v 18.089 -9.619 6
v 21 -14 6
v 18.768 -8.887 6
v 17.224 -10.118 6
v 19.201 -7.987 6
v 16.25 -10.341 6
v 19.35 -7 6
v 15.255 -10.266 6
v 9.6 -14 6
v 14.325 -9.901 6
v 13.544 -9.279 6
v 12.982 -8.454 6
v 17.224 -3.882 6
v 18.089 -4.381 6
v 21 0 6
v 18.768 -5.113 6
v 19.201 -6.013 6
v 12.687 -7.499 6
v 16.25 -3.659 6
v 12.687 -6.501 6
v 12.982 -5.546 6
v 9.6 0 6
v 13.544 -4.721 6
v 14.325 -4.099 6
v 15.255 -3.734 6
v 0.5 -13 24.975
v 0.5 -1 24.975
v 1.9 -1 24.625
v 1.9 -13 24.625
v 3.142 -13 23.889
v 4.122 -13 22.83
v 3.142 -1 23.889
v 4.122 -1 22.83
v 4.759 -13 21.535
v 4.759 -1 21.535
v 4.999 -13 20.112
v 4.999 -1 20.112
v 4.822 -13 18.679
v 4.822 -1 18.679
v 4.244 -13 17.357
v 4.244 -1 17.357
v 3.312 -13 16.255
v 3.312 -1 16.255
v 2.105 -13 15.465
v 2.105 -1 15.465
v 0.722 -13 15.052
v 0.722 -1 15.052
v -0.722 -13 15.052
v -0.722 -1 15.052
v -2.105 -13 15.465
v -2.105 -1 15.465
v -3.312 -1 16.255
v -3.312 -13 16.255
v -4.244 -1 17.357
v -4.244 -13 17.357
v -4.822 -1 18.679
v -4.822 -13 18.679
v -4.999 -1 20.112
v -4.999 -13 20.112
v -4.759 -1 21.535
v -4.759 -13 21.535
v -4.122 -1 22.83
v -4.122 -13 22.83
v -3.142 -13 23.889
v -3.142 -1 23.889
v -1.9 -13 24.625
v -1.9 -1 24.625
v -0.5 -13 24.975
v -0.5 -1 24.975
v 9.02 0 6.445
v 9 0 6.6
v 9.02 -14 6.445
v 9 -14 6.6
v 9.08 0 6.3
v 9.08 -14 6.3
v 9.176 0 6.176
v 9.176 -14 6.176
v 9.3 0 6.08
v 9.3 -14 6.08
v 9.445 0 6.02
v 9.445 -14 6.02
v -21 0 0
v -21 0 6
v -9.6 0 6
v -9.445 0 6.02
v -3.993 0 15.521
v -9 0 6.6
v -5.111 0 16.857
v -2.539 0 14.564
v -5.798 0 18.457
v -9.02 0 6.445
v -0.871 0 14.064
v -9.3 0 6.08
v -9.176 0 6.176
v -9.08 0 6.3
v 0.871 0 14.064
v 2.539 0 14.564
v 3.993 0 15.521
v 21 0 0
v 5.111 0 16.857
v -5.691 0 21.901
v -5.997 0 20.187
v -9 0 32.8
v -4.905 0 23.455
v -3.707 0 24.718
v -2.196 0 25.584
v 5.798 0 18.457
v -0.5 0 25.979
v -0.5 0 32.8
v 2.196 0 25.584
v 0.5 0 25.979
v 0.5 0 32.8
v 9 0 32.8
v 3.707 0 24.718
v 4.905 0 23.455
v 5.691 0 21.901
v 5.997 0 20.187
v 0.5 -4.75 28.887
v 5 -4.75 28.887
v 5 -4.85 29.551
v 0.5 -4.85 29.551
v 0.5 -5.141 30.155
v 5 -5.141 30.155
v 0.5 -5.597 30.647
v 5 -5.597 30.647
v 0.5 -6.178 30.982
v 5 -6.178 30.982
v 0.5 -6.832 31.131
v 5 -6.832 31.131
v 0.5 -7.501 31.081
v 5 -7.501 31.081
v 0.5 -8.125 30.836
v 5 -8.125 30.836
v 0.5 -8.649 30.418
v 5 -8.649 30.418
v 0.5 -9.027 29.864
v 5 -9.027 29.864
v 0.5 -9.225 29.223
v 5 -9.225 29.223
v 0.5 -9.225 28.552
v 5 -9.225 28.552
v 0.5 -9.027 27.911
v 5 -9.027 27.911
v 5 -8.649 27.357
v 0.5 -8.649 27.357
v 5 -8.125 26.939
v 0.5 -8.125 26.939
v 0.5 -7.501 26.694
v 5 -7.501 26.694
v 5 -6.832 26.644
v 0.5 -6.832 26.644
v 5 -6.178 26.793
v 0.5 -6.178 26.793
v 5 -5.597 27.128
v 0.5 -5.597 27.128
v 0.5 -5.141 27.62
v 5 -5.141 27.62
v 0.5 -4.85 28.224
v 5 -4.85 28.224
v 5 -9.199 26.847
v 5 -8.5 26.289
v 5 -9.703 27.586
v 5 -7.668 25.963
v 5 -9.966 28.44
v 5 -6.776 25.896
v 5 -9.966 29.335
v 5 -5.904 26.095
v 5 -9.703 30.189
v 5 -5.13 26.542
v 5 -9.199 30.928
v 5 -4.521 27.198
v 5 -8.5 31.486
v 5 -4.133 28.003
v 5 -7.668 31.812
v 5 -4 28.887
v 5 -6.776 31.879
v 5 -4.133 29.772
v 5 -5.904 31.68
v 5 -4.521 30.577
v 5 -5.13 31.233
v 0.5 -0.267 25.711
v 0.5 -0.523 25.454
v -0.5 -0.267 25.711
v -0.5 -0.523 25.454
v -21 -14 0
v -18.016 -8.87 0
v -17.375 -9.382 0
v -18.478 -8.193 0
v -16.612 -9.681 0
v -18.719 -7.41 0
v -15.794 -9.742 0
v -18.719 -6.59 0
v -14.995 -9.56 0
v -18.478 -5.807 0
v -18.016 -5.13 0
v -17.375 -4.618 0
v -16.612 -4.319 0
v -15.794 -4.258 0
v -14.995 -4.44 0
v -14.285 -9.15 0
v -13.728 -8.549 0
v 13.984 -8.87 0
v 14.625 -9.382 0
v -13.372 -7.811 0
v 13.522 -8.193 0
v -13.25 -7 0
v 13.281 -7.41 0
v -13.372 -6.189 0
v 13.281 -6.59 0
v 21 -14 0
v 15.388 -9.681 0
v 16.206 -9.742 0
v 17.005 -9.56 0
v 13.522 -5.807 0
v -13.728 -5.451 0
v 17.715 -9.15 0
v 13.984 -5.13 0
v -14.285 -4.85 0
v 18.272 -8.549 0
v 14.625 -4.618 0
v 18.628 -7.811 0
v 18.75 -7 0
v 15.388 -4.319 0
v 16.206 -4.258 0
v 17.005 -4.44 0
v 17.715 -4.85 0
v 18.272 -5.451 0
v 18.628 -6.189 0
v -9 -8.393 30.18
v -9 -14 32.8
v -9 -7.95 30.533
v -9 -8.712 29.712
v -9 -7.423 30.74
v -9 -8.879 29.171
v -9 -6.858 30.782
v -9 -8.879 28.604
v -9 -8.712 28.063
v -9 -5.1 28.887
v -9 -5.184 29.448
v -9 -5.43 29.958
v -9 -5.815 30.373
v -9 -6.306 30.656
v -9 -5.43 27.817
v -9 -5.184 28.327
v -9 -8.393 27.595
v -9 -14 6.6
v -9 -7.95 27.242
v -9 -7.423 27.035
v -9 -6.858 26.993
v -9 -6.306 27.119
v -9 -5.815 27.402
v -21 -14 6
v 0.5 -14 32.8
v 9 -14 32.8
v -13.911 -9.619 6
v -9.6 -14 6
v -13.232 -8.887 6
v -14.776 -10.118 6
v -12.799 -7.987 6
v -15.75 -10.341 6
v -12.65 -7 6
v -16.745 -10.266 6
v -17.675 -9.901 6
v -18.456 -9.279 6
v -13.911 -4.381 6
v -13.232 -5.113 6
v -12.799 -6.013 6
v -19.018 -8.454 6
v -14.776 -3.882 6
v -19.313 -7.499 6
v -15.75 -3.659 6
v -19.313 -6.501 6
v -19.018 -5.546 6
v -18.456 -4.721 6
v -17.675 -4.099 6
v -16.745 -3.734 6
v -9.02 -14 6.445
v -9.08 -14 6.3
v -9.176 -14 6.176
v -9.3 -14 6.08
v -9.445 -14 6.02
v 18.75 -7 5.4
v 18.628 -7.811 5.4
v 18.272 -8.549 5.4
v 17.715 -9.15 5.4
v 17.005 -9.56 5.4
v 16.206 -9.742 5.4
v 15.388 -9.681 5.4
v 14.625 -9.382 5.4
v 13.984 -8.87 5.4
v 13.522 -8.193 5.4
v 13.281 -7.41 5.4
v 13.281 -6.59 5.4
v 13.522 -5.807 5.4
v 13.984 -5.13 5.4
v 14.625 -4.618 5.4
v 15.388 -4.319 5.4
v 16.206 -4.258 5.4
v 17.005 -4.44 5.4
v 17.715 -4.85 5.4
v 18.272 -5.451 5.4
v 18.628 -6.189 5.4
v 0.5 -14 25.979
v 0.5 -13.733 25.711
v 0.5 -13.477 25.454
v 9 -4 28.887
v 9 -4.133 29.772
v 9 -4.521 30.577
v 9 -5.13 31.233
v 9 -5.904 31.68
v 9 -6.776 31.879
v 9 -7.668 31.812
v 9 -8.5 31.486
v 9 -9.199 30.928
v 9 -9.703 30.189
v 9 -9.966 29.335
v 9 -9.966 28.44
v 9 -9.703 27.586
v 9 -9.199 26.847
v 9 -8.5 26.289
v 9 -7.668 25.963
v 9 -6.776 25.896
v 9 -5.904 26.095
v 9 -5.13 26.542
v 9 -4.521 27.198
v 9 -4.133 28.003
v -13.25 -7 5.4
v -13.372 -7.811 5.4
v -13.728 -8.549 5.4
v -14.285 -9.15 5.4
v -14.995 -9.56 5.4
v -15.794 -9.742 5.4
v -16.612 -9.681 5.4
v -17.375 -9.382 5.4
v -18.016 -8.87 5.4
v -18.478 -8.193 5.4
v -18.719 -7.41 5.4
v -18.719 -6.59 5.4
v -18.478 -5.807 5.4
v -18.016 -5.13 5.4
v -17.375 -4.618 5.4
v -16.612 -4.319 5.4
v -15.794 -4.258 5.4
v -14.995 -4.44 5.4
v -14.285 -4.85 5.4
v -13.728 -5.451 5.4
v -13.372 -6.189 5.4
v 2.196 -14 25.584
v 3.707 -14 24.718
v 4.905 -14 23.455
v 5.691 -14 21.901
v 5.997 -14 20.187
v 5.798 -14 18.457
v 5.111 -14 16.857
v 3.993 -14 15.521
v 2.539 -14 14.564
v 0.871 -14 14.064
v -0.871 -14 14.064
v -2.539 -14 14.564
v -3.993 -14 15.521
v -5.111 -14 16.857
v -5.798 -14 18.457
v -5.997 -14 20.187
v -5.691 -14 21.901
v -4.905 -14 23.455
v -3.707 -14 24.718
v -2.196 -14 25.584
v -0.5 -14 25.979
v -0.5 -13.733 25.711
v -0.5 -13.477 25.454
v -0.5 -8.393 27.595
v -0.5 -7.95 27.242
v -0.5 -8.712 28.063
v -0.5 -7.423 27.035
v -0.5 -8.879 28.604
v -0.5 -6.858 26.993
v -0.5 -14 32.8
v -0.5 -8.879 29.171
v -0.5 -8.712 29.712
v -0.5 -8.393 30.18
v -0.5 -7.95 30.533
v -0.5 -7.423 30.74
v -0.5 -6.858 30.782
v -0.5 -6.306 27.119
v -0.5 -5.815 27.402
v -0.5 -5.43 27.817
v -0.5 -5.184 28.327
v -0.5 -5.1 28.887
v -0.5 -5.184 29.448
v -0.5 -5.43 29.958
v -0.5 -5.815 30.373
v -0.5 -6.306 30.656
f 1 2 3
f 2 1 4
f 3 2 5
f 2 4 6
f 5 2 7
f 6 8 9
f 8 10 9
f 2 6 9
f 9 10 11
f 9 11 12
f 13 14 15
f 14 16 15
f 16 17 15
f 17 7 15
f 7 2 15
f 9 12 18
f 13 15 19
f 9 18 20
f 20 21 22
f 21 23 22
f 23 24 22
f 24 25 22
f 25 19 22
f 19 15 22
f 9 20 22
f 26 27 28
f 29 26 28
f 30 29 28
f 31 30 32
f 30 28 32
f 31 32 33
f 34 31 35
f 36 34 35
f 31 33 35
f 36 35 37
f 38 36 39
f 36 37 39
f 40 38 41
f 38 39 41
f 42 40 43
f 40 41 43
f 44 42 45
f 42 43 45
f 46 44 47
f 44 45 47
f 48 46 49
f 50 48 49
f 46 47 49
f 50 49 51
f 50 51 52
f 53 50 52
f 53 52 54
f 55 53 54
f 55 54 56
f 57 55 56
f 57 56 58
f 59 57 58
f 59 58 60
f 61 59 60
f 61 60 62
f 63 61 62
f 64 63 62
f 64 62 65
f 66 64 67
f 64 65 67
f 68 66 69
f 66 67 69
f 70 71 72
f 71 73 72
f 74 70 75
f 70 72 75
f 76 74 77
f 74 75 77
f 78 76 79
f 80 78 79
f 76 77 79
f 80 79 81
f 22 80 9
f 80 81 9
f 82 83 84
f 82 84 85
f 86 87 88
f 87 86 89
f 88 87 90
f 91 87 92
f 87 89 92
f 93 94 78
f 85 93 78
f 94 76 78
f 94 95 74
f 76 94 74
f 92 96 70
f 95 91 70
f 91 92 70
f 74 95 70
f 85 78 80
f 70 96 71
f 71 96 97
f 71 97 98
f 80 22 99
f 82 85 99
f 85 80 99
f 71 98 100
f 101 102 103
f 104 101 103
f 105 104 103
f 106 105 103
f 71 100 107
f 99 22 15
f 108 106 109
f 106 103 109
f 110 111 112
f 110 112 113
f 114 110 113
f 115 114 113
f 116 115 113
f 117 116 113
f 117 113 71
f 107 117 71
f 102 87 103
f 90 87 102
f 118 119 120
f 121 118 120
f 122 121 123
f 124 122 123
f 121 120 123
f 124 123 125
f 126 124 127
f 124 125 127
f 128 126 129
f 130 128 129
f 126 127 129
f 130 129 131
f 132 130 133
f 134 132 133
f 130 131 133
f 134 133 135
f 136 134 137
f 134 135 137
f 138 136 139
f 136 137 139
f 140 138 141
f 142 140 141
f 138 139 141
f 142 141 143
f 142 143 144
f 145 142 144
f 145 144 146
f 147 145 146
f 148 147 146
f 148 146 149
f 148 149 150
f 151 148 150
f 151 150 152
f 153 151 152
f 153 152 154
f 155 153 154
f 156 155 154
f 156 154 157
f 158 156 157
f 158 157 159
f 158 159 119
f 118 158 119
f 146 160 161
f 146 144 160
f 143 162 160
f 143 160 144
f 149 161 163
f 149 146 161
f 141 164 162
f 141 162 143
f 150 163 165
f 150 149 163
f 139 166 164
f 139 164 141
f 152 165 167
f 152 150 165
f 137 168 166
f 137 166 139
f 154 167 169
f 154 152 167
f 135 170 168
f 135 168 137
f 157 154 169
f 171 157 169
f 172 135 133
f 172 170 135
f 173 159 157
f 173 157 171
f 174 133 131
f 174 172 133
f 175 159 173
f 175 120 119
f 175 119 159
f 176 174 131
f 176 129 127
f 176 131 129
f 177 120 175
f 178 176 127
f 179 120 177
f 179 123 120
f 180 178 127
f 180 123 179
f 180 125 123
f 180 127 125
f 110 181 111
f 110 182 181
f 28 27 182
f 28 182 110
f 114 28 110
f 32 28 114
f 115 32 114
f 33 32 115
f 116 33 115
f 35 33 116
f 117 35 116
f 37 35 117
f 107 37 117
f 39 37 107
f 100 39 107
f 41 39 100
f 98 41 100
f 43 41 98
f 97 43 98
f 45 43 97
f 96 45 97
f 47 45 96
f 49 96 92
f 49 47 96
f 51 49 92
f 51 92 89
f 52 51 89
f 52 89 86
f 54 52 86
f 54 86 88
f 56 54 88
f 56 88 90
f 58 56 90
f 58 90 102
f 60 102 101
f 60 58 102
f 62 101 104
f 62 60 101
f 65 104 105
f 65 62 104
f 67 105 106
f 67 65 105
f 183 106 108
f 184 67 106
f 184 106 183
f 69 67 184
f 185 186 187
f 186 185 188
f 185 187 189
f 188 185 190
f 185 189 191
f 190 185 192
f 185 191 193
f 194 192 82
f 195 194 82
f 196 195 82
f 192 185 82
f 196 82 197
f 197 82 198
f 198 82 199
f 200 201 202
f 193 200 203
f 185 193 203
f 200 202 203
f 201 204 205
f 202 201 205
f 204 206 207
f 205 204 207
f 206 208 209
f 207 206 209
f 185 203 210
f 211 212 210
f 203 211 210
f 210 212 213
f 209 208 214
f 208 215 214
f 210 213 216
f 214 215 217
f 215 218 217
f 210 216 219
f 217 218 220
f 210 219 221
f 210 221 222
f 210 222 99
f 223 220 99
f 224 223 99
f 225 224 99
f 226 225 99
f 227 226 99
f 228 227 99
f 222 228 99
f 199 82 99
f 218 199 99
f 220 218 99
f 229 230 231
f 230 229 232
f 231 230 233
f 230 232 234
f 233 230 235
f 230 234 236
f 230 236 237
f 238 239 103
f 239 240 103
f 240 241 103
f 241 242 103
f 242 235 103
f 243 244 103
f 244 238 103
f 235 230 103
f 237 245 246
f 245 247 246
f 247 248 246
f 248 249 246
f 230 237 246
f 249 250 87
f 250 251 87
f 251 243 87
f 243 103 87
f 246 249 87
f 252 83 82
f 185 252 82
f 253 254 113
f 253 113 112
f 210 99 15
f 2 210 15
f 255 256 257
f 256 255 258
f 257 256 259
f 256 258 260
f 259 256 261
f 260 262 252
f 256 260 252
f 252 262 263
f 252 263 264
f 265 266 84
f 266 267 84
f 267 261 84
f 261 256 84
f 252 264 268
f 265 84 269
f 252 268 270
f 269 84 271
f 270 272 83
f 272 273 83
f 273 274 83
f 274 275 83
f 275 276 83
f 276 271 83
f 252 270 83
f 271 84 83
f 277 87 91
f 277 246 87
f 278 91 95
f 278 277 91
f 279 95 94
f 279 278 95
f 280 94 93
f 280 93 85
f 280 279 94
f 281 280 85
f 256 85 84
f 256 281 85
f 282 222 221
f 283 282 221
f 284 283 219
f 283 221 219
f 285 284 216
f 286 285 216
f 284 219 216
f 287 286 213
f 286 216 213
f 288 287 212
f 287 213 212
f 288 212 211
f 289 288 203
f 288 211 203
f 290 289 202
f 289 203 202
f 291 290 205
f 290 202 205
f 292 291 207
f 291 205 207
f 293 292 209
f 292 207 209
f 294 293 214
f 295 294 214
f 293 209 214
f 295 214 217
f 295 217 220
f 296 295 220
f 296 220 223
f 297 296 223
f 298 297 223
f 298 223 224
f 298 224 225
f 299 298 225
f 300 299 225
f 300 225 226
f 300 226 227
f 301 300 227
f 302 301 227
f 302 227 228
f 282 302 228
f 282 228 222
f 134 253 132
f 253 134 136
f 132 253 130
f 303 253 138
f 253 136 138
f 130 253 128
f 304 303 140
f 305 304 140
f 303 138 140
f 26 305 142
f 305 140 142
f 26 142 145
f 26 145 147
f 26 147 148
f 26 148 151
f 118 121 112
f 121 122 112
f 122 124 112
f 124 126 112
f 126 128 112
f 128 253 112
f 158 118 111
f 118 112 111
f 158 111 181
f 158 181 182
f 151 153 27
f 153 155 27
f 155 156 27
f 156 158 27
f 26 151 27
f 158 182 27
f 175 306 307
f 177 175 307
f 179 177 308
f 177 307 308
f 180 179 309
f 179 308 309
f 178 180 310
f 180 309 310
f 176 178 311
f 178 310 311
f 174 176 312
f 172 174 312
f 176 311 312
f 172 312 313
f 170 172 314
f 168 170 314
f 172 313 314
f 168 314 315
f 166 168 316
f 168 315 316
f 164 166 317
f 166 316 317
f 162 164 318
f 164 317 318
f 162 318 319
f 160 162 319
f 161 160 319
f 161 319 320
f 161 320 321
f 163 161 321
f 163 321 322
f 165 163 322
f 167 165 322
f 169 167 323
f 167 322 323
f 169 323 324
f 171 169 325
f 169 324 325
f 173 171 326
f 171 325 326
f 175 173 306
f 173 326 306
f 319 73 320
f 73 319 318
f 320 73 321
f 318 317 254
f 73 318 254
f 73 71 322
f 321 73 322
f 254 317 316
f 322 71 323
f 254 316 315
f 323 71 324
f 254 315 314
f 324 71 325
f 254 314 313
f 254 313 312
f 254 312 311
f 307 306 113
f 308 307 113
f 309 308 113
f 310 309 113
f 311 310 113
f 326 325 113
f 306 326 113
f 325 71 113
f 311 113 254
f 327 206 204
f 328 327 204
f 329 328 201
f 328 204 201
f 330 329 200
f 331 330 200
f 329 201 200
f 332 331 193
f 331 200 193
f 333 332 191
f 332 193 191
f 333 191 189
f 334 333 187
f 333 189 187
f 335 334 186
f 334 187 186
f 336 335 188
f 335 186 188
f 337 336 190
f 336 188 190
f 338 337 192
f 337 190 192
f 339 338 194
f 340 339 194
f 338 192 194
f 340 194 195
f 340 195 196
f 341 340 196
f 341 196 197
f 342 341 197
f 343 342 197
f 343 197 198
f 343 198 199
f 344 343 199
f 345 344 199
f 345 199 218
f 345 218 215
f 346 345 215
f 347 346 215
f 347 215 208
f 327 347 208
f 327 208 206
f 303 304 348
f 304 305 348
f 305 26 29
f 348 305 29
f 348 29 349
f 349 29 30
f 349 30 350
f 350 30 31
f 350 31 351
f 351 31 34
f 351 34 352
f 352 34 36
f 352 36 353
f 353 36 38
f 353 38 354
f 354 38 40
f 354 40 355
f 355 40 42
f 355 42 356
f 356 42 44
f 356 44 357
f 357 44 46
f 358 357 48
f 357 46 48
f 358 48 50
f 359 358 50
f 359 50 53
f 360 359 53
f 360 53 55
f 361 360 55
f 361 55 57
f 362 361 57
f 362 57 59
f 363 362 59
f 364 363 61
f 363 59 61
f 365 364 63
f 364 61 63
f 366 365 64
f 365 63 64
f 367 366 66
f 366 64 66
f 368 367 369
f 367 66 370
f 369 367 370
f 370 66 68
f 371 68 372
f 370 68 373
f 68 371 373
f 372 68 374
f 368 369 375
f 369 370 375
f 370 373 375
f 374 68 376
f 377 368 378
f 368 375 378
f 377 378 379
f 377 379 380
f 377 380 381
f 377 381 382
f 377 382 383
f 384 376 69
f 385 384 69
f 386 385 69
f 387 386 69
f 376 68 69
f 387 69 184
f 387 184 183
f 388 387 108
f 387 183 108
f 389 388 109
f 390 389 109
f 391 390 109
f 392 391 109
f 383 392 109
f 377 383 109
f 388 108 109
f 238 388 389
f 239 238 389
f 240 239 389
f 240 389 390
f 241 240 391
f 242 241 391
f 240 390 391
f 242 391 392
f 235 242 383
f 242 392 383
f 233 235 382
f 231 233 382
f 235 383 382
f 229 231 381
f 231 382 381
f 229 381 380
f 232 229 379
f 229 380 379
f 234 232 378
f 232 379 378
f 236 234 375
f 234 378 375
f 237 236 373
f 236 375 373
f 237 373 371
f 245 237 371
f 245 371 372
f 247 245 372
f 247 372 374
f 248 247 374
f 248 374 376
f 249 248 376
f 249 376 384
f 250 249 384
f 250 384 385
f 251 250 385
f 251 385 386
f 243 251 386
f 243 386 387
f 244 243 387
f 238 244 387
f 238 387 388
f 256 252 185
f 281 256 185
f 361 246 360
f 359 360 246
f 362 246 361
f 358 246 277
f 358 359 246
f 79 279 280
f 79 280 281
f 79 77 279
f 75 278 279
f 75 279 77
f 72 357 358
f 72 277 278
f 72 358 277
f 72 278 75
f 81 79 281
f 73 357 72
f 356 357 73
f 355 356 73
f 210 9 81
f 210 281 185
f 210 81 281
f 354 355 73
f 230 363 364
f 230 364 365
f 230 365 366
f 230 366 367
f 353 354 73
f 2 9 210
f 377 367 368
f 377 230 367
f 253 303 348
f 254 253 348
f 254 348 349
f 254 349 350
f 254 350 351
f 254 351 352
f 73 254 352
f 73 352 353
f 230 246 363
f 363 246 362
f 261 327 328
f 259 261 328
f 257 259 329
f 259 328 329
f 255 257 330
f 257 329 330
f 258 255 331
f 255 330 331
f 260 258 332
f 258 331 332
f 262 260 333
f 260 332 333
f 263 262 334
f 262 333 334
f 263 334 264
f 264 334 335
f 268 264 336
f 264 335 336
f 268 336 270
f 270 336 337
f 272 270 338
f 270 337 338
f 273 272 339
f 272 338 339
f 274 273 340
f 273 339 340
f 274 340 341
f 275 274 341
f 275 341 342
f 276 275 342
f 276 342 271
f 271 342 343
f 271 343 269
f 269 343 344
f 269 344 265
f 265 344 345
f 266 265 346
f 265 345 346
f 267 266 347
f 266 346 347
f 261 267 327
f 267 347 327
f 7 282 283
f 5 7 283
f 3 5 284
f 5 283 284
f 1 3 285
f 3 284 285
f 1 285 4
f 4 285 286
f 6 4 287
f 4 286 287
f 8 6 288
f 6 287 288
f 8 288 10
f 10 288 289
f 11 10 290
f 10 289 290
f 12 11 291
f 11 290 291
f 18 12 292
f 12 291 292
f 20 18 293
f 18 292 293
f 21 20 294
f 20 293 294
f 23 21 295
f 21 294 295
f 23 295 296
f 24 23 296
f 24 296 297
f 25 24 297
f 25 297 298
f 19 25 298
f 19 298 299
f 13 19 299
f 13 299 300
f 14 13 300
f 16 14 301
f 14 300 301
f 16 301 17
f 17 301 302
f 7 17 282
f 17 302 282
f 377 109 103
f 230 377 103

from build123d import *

# Parameters (mm, degrees)
F1_DEPTH      = 14
F2_R          = 2.75
F3_DEPTH      = 32.801
F4_SIZE       = 1
F5_R          = 0.6
F6_SIZE       = 0.6
F7_R          = 1.9
F8_DEPTH      = 20.501
F8_DEPTH_BACK = 21.501
F9_R          = 2.25
F10_DEPTH     = 9.5
F11_R         = 3
F12_DEPTH     = 4


with BuildPart() as f1:
    # F0 (on Front) → F1 (new body)
    with BuildSketch(Plane.XZ):
        with BuildLine():
            Line((-21, 0), (0, 0))
            Line((0, 0), (21, 0))
            Line((21, 0), (21, 6))
            Line((21, 6), (9, 6))
            Line((9, 6), (9, 32.8))
            Line((9, 32.8), (0.5, 32.8))
            Line((0.5, 32.8), (0.5, 24.9749371855))
            ThreePointArc((0.5, 24.9749371855), (0, 15), (-0.5, 24.9749371855))
            Line((-0.5, 24.9749371855), (-0.5, 32.8))
            Line((-0.5, 32.8), (-9, 32.8))
            Line((-9, 32.8), (-9, 6))
            Line((-9, 6), (-21, 6))
            Line((-21, 6), (-21, 0))
        make_face()
    extrude(amount=F1_DEPTH)

    # F2 (on face) → F3 (cut, through all)
    with BuildSketch(Plane(origin=(0, 0, 0), x_dir=(1, 0, 0), z_dir=(0, 0, -1))):
        with Locations((-16, 7)):
            Circle(F2_R)
        with Locations((16, 7)):
            Circle(F2_R)
    extrude(amount=-F3_DEPTH, mode=Mode.SUBTRACT)

    # F4
    f4_edges = [f1.edges().sort_by_distance(p)[0] for p in [
        (0, -14, 15),
        (0, 0, 15),
    ]]
    chamfer(f4_edges, length=F4_SIZE)

    # F5
    f5_edges = [f1.edges().sort_by_distance(p)[0] for p in [
        (9, -7, 6),
        (-9, -7, 6),
    ]]
    fillet(f5_edges, radius=F5_R)

    # F6
    f6_edges = [f1.edges().sort_by_distance(p)[0] for p in [
        (13.25, -7, 6),
        (-18.75, -7, 6),
    ]]
    chamfer(f6_edges, length=F6_SIZE)

    # F7 (on face) → F8 (cut, two sides)
    with BuildSketch(Plane.YZ.offset(-0.5)) as f8_sk:
        with Locations((-7, 28.8874685928)):
            Circle(F7_R)
    extrude(amount=-F8_DEPTH, mode=Mode.SUBTRACT)
    extrude(f8_sk.sketch, amount=F8_DEPTH_BACK, mode=Mode.SUBTRACT)

    # F9 (on face) → F10 (cut, through all)
    with BuildSketch(Plane.YZ.offset(9)):
        with Locations((-7, 28.8874685928)):
            Circle(F9_R)
    extrude(amount=-F10_DEPTH, mode=Mode.SUBTRACT)

    # F11 (on face) → F12 (cut)
    with BuildSketch(Plane.YZ.offset(9)):
        with Locations((-7, 28.8874685928)):
            Circle(F11_R)
    extrude(amount=-F12_DEPTH, mode=Mode.SUBTRACT)


solid = f1.part
